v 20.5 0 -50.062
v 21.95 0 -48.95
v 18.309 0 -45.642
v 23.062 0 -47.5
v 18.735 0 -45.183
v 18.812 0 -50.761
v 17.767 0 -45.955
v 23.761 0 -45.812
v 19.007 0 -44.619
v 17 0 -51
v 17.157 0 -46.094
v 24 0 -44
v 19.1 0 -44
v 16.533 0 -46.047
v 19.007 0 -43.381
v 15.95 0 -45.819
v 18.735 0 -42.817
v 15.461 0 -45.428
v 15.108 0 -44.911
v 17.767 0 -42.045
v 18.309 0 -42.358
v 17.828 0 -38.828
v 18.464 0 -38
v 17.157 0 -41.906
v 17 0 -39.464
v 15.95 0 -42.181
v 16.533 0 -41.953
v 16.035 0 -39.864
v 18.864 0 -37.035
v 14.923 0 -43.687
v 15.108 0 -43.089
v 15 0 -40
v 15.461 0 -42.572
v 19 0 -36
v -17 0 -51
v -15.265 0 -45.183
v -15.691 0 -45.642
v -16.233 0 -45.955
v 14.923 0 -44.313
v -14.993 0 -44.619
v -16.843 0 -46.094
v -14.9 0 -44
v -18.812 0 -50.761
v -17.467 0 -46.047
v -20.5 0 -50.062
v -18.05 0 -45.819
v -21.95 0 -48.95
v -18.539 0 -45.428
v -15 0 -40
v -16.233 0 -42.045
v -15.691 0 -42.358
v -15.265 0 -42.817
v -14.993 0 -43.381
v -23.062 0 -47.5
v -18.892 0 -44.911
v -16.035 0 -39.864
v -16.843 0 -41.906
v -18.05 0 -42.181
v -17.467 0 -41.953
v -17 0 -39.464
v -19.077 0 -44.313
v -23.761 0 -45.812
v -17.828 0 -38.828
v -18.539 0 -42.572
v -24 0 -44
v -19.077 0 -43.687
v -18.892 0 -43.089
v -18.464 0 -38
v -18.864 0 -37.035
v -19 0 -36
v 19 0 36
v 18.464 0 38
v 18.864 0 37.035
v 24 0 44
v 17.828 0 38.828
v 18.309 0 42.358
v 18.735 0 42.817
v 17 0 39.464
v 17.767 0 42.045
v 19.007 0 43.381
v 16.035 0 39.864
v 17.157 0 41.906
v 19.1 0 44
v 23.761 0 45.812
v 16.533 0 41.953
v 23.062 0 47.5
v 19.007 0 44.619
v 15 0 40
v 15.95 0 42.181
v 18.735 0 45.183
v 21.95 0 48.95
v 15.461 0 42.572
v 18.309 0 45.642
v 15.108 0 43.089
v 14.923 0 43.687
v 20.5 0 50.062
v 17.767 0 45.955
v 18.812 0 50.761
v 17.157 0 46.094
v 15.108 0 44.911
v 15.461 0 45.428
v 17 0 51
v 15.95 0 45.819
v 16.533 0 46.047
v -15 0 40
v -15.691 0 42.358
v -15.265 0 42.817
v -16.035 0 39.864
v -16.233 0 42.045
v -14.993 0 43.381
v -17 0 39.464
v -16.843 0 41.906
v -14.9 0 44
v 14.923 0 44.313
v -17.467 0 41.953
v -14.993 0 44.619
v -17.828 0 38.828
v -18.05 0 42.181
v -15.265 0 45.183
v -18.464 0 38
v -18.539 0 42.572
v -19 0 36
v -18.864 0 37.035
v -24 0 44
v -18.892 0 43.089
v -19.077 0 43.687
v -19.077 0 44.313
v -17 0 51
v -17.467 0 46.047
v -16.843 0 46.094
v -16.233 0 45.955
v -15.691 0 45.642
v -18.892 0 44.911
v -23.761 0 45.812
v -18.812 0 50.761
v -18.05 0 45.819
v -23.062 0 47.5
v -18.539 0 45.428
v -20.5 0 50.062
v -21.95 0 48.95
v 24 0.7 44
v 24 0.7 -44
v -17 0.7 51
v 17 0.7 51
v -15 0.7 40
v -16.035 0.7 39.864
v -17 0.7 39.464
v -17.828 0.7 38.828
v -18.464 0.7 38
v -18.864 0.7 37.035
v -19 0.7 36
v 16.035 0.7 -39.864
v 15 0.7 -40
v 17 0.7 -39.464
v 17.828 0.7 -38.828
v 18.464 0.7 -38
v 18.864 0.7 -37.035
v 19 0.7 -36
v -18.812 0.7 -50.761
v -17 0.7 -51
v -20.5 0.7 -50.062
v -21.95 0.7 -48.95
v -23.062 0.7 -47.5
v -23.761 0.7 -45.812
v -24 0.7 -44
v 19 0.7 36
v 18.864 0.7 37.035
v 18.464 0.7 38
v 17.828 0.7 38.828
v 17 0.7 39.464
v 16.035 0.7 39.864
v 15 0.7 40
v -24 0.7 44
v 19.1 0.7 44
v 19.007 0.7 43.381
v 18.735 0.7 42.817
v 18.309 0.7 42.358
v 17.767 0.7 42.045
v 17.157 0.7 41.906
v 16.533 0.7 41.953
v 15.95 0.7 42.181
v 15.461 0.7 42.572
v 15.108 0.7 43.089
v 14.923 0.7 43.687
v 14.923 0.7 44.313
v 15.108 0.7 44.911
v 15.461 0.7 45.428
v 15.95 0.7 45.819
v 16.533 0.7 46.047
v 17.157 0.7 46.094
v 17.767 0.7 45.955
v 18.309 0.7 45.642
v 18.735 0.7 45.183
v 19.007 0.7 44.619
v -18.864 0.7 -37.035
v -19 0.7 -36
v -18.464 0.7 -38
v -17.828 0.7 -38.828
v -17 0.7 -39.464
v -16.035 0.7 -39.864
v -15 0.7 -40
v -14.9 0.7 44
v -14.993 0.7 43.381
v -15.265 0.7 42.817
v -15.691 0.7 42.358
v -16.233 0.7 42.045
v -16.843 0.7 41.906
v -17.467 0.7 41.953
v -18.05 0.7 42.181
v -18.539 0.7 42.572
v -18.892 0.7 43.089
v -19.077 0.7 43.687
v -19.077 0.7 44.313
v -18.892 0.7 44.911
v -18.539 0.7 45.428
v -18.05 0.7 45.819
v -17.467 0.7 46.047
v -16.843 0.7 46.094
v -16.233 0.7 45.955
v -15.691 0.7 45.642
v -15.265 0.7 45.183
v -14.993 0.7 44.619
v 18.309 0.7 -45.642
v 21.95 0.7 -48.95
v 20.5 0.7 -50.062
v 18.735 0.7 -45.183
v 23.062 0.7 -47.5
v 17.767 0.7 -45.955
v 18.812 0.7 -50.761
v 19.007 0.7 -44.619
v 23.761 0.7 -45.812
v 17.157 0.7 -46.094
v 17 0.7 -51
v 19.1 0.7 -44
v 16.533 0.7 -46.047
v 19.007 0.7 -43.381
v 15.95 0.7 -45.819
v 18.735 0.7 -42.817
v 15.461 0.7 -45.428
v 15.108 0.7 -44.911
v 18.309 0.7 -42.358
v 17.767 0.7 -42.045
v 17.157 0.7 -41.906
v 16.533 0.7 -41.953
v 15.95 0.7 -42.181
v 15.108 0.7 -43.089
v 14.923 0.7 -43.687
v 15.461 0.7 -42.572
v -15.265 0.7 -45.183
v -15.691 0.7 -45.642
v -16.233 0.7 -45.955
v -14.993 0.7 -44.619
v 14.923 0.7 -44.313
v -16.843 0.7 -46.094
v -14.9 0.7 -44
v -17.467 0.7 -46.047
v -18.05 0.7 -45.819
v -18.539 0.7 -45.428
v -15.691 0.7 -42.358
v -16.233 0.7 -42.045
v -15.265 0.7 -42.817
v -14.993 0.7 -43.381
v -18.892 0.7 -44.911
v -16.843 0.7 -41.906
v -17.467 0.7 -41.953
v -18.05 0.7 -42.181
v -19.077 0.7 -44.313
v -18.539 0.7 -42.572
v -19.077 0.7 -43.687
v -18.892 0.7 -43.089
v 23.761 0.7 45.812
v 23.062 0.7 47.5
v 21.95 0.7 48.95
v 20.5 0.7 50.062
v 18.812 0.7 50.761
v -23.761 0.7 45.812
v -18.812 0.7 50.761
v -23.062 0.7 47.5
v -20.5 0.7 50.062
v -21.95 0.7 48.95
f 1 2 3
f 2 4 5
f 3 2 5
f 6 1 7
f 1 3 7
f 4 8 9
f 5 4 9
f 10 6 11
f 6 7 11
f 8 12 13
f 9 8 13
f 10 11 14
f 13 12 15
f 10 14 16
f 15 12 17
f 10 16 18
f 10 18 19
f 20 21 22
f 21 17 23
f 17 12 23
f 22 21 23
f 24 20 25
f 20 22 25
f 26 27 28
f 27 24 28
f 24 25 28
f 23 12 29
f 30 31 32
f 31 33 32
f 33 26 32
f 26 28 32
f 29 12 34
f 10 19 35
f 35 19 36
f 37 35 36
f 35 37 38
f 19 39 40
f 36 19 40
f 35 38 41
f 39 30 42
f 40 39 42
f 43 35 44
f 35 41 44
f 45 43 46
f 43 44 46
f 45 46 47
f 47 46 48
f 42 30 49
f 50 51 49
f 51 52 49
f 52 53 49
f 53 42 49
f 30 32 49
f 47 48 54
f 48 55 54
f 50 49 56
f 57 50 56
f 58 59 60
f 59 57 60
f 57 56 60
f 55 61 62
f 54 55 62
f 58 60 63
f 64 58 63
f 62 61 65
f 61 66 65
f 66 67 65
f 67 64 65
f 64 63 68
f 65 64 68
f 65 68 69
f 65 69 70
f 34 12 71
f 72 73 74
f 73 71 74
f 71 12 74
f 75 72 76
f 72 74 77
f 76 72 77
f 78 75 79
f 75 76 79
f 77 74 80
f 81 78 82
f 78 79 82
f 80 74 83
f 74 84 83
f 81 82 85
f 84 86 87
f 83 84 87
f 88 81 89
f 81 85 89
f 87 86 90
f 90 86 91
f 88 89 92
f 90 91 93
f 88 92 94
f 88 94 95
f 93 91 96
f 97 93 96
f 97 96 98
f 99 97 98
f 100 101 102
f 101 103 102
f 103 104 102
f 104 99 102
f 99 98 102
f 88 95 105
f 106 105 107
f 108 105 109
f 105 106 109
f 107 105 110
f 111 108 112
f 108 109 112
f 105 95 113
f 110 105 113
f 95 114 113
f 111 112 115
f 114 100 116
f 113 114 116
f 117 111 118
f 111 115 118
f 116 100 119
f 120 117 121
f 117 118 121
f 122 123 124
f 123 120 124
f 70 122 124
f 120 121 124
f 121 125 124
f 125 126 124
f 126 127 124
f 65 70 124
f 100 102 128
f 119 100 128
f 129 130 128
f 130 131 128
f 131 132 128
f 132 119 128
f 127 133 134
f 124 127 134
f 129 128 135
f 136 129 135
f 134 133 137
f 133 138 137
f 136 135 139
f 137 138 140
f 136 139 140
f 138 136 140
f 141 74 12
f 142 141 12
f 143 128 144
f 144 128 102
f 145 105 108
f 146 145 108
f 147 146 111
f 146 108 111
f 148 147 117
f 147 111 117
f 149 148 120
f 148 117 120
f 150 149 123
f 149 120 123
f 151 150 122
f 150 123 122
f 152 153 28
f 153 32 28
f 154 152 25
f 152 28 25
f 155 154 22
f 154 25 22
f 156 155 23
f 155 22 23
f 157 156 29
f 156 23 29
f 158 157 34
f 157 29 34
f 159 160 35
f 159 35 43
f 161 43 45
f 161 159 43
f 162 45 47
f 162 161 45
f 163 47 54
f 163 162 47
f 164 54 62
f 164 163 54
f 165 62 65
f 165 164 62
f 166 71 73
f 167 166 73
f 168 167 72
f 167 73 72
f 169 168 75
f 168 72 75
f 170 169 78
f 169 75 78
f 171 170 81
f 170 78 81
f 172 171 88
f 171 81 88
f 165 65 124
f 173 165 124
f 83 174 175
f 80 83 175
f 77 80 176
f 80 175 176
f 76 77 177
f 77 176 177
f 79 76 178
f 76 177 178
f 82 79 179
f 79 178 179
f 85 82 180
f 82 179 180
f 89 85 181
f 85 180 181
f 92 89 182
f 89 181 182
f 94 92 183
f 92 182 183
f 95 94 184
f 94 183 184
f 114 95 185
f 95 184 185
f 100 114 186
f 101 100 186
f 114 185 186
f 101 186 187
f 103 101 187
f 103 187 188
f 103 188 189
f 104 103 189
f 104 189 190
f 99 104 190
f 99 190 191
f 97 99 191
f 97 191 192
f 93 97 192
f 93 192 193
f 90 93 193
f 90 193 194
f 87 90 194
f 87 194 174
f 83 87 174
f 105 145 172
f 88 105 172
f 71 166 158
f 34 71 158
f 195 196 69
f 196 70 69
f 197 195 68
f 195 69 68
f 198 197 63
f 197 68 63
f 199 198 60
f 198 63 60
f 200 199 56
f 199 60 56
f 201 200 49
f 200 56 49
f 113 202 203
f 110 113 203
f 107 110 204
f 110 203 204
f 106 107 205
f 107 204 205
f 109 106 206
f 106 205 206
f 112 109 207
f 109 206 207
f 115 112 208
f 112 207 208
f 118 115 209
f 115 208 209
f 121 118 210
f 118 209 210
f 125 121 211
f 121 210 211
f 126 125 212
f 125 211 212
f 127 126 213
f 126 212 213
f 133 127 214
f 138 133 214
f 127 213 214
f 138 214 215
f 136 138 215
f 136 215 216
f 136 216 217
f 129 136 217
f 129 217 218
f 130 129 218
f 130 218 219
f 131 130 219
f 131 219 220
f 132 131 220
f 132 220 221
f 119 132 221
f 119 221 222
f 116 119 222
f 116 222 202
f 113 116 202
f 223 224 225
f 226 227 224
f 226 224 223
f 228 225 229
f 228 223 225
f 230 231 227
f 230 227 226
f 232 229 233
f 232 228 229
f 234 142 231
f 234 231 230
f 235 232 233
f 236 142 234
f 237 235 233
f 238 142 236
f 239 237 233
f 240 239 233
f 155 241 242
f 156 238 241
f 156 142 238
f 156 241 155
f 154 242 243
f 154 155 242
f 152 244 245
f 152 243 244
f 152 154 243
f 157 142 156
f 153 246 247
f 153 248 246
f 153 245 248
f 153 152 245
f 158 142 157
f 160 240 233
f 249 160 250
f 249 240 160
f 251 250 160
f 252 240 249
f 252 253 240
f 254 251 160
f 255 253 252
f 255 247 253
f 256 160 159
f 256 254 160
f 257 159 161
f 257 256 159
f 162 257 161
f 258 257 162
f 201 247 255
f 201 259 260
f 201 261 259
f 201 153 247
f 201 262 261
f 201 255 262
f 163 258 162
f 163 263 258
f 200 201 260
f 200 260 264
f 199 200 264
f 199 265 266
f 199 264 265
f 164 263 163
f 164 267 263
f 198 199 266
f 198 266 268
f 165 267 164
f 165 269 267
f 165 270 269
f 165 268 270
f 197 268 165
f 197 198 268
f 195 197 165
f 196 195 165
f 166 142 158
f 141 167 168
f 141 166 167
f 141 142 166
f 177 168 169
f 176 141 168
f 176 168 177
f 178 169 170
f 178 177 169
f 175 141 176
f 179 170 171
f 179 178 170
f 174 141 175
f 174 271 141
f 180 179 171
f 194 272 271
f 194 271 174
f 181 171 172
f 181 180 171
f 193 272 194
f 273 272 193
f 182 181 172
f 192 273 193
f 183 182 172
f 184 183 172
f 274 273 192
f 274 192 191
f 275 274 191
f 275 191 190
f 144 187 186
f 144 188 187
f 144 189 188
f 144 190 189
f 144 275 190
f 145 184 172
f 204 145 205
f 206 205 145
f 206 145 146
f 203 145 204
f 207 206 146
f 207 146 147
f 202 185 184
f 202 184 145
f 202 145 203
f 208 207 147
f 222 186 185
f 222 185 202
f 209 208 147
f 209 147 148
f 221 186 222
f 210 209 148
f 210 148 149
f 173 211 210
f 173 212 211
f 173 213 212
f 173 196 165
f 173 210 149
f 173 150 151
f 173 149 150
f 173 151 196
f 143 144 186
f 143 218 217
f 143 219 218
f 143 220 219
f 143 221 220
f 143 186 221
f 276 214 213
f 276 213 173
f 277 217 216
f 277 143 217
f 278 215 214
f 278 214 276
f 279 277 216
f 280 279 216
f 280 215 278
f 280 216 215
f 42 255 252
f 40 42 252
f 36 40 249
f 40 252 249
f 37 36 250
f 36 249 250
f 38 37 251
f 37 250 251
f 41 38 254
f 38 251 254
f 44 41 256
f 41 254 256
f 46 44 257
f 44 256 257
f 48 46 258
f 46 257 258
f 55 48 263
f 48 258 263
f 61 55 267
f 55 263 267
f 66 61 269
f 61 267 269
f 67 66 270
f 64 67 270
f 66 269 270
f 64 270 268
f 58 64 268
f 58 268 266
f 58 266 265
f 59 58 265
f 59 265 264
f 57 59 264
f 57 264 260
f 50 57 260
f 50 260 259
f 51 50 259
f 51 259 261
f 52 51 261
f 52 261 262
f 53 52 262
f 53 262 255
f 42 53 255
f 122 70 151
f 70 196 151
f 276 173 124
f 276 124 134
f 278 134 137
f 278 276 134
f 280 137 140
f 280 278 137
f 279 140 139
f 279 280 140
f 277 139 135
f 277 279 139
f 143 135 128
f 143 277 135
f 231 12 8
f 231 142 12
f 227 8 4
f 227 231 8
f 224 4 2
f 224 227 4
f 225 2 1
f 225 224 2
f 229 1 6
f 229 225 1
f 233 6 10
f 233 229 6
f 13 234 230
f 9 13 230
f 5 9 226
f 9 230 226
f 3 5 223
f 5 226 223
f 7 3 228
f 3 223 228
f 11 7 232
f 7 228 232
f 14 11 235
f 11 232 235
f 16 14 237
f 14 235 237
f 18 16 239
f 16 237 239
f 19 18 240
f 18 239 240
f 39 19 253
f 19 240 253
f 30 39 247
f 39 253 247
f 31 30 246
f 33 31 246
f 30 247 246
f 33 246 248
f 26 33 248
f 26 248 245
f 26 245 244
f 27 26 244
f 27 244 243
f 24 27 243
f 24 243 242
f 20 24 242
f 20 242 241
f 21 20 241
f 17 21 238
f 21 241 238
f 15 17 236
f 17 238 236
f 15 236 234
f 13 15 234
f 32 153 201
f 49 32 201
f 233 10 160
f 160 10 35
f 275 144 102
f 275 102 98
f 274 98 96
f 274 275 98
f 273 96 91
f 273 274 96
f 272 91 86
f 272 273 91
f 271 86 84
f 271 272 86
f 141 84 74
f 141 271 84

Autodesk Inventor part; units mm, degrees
ref_plane "YZ Plane" through (0, 0, 0) normal (1, 0, 0) x (0, 1, 0)
ref_plane "XZ Plane" through (0, 0, 0) normal (0, 1, 0) x (-1, 0, 0)
ref_plane "XY Plane" through (0, 0, 0) normal (0, 0, 1) x (1, 0, 0)
sketch "Sketch1" plane through (0, 0, 0) normal (0, 1, 0) x (-1, 0, 0)
  line L0 (24, 51) -> (-24, 51)
  line L1 (-24, 51) -> (-24, -51)
  line L2 (-24, -51) -> (24, -51)
  line L3 (24, -51) -> (24, 51)
  line L4 (24, 51) -> (-24, -51) construction
  line L5 (-24, 51) -> (24, -51) construction
  point P0 (0, 0)
  dimension "d0" = 48
  dimension "d1" = 102
extrude "Extrusion1" add sketch "Sketch1" along normal blind 0.7
fillet "Fillet1" radius 7 4 edges at (-24, 0.35, 51) (24, 0.35, 51) (24, 0.35, -51) (-24, 0.35, -51)
sketch "Sketch2" plane through (0, 0.7, 0) normal (0, 1, 0) x (1, 0, 0)
  circle A0 centre (-17, 44) radius 2.1
  arc A1 (-17, 51) -> (-24, 44) centre (-17, 44) ccw construction
  circle A2 centre (17, 44) radius 2.1
  arc A3 (24, 44) -> (17, 51) centre (17, 44) ccw construction
  circle A4 centre (-17, -44) radius 2.1
  arc A5 (-24, -44) -> (-17, -51) centre (-17, -44) ccw construction
  circle A6 centre (17, -44) radius 2.1
  arc A7 (17, -51) -> (24, -44) centre (17, -44) ccw construction
  point P0 (0, 0)
  dimension "d5" = 4.2
  dimension "d6" = 4.2
  dimension "d7" = 4.2
  dimension "d8" = 4.2
extrude "Extrusion2" cut sketch "Sketch2" against normal through all
sketch "Sketch3" plane through (0, 0.7, 0) normal (0, 1, 0) x (1, 0, 0)
  line L0 (-19, -40) -> (19, -40)
  line L1 (19, -40) -> (19, 40)
  line L2 (19, 40) -> (-19, 40)
  line L3 (-19, 40) -> (-19, -40)
  line L4 (-19, -40) -> (19, 40) construction
  line L5 (19, -40) -> (-19, 40) construction
  point P0 (0, 0)
  dimension "d11" = 38
  dimension "d12" = 80
extrude "Extrusion3" cut sketch "Sketch3" against normal through all
fillet "Fillet2" radius 4 4 edges at (-19, 0.35, -40) (19, 0.35, -40) (19, 0.35, 40) (-19, 0.35, 40)
properties part number "GearBoxSpacers"
